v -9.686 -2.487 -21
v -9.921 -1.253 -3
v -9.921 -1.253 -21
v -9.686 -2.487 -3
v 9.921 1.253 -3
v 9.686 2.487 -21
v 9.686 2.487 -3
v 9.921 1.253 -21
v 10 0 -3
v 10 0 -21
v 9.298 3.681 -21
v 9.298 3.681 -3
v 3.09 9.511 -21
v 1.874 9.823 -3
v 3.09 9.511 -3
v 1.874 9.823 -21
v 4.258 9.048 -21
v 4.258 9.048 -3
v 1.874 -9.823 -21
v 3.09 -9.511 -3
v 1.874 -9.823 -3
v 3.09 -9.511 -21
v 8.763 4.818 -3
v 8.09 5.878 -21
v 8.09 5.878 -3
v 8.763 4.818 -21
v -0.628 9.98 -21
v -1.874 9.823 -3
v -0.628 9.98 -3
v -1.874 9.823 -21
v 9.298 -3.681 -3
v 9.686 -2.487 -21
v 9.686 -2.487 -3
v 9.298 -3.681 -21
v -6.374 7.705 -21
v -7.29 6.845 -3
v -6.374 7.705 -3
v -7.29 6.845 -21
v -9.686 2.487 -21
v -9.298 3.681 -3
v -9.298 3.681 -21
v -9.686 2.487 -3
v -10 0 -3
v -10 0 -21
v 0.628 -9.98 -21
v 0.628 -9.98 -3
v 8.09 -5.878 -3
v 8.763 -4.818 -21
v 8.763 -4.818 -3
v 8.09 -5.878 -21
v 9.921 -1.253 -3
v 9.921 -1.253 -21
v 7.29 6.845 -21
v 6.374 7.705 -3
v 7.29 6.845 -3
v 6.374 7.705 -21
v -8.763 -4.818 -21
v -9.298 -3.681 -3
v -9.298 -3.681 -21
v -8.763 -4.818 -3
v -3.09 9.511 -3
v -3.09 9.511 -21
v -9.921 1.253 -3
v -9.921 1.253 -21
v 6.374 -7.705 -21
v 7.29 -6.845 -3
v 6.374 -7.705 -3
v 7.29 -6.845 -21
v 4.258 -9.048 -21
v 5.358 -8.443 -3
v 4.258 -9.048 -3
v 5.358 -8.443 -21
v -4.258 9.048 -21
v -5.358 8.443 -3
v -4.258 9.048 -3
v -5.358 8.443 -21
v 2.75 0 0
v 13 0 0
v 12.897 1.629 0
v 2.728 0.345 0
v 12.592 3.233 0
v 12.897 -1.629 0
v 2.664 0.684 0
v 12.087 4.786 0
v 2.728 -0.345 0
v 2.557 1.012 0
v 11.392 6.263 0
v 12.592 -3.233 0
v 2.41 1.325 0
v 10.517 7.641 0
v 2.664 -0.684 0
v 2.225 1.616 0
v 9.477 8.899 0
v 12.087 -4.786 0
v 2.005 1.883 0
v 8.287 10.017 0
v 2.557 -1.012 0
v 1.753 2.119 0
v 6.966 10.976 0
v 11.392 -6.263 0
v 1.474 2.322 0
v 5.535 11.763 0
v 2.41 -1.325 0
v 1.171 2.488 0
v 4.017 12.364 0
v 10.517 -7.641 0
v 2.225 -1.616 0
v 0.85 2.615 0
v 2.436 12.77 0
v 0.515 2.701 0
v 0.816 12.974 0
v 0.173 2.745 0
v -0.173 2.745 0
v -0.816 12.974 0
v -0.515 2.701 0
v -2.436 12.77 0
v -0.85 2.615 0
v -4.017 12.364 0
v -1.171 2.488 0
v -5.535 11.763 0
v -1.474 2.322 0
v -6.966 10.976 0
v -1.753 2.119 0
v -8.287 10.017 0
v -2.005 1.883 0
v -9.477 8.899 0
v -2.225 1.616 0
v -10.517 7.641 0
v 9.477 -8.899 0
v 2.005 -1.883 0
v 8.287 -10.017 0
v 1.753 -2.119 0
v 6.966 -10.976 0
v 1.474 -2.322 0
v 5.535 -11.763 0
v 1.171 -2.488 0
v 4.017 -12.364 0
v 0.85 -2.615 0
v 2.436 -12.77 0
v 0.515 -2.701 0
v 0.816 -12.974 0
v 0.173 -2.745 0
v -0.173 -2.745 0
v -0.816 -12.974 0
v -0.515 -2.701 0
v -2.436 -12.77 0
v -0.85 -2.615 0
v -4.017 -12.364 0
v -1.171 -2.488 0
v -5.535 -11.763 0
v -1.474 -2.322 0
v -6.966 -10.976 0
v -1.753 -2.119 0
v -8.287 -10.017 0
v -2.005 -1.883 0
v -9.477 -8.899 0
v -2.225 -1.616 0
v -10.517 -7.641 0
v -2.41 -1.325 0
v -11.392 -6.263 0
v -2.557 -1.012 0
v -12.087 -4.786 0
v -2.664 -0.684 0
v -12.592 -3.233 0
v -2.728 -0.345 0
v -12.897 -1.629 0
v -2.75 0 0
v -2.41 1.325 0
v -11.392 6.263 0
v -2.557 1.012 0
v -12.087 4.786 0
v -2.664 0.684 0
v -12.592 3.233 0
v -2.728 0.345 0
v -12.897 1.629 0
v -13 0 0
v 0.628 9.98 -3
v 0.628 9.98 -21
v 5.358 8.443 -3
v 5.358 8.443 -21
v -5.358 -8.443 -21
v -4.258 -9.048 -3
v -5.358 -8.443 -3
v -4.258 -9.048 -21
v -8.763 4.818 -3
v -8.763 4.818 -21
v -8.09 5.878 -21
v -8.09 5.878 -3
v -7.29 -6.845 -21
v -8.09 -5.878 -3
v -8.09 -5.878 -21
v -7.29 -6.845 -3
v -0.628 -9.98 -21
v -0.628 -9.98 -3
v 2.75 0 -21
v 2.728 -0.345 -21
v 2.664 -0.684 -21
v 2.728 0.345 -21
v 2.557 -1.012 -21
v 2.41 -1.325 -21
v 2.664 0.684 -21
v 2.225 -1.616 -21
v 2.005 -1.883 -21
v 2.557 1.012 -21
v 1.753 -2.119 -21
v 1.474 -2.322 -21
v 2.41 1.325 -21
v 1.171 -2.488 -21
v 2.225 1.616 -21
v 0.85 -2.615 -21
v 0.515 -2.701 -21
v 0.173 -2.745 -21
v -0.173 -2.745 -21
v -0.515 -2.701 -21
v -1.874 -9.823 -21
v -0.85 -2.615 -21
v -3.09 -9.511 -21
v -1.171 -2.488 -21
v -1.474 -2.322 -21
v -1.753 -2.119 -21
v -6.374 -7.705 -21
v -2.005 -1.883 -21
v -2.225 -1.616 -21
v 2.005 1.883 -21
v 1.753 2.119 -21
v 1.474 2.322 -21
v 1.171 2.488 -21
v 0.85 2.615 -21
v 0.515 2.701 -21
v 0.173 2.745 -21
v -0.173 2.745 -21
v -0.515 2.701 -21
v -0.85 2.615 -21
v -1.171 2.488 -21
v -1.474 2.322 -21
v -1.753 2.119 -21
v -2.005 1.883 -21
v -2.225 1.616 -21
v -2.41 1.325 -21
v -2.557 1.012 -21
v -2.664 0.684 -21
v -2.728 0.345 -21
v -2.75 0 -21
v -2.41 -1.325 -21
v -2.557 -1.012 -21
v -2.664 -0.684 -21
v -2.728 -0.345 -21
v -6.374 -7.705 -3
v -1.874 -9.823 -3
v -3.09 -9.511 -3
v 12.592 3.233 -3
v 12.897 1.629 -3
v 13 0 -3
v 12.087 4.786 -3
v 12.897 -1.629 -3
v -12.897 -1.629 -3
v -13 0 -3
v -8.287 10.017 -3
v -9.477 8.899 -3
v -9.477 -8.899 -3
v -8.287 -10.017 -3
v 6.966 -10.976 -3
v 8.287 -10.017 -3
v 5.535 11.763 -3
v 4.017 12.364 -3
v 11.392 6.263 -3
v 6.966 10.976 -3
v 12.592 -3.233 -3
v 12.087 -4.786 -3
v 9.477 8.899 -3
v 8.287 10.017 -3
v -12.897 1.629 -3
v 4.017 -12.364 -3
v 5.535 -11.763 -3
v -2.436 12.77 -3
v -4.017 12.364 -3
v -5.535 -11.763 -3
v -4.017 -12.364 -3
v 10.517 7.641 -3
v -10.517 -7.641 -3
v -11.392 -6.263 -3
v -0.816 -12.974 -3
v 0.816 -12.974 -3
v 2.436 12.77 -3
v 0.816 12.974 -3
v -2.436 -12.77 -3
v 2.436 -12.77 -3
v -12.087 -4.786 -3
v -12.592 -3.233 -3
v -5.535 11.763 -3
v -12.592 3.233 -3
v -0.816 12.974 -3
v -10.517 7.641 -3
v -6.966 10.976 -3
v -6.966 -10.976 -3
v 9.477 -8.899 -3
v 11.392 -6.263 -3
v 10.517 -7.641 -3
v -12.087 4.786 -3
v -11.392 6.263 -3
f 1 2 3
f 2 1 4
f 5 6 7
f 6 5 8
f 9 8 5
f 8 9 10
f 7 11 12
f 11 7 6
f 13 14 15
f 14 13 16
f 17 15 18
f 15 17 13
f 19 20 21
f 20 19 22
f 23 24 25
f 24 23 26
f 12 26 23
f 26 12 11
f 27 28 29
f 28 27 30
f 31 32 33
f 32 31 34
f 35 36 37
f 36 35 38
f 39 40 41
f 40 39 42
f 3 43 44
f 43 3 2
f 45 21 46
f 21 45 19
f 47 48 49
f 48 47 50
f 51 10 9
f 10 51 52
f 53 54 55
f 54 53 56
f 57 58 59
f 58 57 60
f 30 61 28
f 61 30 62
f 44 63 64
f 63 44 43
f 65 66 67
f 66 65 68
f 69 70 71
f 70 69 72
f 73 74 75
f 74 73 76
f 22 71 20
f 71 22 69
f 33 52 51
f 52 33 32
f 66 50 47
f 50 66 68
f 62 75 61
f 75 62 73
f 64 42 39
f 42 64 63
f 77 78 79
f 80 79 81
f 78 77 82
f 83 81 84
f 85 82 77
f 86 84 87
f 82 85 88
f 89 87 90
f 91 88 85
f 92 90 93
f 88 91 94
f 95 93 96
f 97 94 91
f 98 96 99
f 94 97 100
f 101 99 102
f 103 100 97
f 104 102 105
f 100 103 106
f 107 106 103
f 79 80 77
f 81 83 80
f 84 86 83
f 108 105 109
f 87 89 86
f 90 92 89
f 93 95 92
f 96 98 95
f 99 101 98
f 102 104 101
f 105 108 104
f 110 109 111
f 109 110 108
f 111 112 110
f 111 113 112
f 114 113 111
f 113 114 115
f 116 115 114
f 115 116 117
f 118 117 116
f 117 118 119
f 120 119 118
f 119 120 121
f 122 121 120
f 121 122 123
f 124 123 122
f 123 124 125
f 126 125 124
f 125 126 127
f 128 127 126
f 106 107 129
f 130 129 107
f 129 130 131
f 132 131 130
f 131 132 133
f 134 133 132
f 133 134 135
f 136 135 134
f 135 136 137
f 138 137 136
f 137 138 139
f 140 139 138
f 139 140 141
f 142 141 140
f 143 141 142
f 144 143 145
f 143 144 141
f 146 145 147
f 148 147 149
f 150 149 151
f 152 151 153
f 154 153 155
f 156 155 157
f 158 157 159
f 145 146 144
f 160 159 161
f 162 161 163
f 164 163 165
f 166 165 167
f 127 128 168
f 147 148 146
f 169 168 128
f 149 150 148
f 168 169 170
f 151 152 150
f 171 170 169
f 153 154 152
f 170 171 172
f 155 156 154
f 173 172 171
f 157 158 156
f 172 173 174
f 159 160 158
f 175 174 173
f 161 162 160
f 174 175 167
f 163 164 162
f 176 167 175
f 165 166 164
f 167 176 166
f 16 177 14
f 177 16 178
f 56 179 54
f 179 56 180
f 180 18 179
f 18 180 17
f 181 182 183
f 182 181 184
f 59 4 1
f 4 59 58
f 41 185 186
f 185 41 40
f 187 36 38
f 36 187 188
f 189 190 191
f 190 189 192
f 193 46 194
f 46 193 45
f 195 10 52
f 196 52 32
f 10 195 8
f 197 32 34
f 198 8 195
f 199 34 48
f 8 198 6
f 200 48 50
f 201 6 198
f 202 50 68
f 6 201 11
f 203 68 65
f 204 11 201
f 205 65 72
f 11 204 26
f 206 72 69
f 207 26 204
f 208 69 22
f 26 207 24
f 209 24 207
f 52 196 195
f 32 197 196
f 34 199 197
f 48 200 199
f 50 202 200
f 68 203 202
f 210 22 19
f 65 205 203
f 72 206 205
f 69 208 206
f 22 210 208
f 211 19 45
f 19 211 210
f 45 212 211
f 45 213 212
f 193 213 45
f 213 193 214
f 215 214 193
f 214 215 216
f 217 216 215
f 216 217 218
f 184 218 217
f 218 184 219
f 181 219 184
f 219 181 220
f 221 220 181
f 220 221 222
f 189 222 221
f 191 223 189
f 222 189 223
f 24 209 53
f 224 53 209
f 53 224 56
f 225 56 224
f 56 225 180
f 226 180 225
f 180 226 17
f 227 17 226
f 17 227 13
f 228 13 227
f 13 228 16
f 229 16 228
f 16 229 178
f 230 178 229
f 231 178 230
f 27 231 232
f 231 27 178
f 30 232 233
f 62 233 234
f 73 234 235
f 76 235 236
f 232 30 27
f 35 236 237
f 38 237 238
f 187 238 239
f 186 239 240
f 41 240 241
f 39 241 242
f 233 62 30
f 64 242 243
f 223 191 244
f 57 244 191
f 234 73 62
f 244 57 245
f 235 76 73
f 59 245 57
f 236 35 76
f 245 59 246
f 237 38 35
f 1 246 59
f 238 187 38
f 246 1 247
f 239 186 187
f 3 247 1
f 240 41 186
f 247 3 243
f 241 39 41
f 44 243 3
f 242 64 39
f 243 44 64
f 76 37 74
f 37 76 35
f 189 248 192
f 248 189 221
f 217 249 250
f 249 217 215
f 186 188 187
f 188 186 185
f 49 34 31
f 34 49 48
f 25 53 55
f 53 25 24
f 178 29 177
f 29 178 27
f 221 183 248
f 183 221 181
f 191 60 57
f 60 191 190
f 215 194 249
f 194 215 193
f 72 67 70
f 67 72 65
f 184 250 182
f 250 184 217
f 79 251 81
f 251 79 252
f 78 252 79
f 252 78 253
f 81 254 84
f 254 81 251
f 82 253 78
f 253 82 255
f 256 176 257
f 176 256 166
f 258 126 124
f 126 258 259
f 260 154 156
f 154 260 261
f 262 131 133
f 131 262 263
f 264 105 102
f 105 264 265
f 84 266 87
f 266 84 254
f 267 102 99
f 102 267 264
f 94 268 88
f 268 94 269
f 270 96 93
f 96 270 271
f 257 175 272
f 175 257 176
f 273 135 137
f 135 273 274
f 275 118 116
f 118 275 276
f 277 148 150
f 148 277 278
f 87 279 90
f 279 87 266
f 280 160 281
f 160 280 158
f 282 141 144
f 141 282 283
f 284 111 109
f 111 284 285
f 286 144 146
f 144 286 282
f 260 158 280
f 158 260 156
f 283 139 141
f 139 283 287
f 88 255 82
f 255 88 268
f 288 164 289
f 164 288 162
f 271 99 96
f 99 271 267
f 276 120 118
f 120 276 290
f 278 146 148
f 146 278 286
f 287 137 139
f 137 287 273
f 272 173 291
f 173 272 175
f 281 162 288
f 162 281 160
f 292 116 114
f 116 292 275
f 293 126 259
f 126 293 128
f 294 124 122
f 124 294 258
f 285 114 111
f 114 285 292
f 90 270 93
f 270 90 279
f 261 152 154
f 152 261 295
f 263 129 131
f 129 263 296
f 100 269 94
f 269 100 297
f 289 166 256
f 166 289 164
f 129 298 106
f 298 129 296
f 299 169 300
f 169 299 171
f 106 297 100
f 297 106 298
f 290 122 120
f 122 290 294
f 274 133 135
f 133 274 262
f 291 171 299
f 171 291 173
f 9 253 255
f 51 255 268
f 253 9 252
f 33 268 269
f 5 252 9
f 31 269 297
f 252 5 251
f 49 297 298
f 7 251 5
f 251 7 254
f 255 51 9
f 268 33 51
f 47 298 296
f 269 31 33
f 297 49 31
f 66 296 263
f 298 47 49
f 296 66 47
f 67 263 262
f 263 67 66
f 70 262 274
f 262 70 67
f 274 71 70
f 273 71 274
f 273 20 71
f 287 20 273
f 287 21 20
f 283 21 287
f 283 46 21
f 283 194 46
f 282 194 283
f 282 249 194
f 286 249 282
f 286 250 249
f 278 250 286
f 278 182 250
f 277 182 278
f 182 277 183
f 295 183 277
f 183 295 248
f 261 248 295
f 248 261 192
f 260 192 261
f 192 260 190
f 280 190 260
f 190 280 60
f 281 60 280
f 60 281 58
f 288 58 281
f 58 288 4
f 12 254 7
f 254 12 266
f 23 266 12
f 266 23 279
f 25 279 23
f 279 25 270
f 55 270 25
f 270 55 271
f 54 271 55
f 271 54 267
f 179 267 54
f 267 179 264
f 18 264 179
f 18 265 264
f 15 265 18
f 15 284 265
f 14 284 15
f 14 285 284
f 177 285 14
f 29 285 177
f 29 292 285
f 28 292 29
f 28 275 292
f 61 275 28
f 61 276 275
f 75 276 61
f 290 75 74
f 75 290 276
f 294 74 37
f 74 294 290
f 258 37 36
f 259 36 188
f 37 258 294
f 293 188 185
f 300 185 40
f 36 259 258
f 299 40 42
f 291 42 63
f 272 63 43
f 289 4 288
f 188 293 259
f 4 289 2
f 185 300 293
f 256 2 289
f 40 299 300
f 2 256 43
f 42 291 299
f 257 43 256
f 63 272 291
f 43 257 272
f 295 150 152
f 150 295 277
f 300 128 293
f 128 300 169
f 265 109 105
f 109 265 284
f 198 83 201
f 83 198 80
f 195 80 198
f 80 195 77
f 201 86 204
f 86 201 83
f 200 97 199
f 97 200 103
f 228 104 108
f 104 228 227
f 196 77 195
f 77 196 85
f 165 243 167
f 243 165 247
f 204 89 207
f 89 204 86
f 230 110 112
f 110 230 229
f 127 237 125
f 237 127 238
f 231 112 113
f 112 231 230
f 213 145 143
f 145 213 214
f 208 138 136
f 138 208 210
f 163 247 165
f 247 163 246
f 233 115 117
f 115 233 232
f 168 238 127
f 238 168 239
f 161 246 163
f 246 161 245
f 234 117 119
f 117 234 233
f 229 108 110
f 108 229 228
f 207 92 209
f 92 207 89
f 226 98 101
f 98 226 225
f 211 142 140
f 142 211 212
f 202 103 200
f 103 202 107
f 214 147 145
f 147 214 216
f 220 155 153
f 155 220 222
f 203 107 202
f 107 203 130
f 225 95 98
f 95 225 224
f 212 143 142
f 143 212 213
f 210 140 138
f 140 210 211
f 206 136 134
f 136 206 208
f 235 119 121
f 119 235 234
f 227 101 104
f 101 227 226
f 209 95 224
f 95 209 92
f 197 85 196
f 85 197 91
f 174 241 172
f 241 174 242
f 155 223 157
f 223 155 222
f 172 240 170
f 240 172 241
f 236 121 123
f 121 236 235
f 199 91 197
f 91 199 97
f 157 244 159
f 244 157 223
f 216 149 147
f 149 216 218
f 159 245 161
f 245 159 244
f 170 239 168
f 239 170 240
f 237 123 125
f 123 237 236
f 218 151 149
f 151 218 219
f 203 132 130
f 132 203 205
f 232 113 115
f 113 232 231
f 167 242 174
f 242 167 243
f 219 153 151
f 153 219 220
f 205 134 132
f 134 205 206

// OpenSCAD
$fn = 50;


difference() {
	union() {
		translate(v = [0, 0, -21.0000000000]) {
			cylinder(h = 21, r = 10.0000000000);
		}
		translate(v = [0, 0, -3.0000000000]) {
			cylinder(h = 3, r = 13.0000000000);
		}
	}
	union() {
		#translate(v = [0, 0, -21]) {
			cylinder(h = 21, r = 2.7500000000);
		}
	}
}
